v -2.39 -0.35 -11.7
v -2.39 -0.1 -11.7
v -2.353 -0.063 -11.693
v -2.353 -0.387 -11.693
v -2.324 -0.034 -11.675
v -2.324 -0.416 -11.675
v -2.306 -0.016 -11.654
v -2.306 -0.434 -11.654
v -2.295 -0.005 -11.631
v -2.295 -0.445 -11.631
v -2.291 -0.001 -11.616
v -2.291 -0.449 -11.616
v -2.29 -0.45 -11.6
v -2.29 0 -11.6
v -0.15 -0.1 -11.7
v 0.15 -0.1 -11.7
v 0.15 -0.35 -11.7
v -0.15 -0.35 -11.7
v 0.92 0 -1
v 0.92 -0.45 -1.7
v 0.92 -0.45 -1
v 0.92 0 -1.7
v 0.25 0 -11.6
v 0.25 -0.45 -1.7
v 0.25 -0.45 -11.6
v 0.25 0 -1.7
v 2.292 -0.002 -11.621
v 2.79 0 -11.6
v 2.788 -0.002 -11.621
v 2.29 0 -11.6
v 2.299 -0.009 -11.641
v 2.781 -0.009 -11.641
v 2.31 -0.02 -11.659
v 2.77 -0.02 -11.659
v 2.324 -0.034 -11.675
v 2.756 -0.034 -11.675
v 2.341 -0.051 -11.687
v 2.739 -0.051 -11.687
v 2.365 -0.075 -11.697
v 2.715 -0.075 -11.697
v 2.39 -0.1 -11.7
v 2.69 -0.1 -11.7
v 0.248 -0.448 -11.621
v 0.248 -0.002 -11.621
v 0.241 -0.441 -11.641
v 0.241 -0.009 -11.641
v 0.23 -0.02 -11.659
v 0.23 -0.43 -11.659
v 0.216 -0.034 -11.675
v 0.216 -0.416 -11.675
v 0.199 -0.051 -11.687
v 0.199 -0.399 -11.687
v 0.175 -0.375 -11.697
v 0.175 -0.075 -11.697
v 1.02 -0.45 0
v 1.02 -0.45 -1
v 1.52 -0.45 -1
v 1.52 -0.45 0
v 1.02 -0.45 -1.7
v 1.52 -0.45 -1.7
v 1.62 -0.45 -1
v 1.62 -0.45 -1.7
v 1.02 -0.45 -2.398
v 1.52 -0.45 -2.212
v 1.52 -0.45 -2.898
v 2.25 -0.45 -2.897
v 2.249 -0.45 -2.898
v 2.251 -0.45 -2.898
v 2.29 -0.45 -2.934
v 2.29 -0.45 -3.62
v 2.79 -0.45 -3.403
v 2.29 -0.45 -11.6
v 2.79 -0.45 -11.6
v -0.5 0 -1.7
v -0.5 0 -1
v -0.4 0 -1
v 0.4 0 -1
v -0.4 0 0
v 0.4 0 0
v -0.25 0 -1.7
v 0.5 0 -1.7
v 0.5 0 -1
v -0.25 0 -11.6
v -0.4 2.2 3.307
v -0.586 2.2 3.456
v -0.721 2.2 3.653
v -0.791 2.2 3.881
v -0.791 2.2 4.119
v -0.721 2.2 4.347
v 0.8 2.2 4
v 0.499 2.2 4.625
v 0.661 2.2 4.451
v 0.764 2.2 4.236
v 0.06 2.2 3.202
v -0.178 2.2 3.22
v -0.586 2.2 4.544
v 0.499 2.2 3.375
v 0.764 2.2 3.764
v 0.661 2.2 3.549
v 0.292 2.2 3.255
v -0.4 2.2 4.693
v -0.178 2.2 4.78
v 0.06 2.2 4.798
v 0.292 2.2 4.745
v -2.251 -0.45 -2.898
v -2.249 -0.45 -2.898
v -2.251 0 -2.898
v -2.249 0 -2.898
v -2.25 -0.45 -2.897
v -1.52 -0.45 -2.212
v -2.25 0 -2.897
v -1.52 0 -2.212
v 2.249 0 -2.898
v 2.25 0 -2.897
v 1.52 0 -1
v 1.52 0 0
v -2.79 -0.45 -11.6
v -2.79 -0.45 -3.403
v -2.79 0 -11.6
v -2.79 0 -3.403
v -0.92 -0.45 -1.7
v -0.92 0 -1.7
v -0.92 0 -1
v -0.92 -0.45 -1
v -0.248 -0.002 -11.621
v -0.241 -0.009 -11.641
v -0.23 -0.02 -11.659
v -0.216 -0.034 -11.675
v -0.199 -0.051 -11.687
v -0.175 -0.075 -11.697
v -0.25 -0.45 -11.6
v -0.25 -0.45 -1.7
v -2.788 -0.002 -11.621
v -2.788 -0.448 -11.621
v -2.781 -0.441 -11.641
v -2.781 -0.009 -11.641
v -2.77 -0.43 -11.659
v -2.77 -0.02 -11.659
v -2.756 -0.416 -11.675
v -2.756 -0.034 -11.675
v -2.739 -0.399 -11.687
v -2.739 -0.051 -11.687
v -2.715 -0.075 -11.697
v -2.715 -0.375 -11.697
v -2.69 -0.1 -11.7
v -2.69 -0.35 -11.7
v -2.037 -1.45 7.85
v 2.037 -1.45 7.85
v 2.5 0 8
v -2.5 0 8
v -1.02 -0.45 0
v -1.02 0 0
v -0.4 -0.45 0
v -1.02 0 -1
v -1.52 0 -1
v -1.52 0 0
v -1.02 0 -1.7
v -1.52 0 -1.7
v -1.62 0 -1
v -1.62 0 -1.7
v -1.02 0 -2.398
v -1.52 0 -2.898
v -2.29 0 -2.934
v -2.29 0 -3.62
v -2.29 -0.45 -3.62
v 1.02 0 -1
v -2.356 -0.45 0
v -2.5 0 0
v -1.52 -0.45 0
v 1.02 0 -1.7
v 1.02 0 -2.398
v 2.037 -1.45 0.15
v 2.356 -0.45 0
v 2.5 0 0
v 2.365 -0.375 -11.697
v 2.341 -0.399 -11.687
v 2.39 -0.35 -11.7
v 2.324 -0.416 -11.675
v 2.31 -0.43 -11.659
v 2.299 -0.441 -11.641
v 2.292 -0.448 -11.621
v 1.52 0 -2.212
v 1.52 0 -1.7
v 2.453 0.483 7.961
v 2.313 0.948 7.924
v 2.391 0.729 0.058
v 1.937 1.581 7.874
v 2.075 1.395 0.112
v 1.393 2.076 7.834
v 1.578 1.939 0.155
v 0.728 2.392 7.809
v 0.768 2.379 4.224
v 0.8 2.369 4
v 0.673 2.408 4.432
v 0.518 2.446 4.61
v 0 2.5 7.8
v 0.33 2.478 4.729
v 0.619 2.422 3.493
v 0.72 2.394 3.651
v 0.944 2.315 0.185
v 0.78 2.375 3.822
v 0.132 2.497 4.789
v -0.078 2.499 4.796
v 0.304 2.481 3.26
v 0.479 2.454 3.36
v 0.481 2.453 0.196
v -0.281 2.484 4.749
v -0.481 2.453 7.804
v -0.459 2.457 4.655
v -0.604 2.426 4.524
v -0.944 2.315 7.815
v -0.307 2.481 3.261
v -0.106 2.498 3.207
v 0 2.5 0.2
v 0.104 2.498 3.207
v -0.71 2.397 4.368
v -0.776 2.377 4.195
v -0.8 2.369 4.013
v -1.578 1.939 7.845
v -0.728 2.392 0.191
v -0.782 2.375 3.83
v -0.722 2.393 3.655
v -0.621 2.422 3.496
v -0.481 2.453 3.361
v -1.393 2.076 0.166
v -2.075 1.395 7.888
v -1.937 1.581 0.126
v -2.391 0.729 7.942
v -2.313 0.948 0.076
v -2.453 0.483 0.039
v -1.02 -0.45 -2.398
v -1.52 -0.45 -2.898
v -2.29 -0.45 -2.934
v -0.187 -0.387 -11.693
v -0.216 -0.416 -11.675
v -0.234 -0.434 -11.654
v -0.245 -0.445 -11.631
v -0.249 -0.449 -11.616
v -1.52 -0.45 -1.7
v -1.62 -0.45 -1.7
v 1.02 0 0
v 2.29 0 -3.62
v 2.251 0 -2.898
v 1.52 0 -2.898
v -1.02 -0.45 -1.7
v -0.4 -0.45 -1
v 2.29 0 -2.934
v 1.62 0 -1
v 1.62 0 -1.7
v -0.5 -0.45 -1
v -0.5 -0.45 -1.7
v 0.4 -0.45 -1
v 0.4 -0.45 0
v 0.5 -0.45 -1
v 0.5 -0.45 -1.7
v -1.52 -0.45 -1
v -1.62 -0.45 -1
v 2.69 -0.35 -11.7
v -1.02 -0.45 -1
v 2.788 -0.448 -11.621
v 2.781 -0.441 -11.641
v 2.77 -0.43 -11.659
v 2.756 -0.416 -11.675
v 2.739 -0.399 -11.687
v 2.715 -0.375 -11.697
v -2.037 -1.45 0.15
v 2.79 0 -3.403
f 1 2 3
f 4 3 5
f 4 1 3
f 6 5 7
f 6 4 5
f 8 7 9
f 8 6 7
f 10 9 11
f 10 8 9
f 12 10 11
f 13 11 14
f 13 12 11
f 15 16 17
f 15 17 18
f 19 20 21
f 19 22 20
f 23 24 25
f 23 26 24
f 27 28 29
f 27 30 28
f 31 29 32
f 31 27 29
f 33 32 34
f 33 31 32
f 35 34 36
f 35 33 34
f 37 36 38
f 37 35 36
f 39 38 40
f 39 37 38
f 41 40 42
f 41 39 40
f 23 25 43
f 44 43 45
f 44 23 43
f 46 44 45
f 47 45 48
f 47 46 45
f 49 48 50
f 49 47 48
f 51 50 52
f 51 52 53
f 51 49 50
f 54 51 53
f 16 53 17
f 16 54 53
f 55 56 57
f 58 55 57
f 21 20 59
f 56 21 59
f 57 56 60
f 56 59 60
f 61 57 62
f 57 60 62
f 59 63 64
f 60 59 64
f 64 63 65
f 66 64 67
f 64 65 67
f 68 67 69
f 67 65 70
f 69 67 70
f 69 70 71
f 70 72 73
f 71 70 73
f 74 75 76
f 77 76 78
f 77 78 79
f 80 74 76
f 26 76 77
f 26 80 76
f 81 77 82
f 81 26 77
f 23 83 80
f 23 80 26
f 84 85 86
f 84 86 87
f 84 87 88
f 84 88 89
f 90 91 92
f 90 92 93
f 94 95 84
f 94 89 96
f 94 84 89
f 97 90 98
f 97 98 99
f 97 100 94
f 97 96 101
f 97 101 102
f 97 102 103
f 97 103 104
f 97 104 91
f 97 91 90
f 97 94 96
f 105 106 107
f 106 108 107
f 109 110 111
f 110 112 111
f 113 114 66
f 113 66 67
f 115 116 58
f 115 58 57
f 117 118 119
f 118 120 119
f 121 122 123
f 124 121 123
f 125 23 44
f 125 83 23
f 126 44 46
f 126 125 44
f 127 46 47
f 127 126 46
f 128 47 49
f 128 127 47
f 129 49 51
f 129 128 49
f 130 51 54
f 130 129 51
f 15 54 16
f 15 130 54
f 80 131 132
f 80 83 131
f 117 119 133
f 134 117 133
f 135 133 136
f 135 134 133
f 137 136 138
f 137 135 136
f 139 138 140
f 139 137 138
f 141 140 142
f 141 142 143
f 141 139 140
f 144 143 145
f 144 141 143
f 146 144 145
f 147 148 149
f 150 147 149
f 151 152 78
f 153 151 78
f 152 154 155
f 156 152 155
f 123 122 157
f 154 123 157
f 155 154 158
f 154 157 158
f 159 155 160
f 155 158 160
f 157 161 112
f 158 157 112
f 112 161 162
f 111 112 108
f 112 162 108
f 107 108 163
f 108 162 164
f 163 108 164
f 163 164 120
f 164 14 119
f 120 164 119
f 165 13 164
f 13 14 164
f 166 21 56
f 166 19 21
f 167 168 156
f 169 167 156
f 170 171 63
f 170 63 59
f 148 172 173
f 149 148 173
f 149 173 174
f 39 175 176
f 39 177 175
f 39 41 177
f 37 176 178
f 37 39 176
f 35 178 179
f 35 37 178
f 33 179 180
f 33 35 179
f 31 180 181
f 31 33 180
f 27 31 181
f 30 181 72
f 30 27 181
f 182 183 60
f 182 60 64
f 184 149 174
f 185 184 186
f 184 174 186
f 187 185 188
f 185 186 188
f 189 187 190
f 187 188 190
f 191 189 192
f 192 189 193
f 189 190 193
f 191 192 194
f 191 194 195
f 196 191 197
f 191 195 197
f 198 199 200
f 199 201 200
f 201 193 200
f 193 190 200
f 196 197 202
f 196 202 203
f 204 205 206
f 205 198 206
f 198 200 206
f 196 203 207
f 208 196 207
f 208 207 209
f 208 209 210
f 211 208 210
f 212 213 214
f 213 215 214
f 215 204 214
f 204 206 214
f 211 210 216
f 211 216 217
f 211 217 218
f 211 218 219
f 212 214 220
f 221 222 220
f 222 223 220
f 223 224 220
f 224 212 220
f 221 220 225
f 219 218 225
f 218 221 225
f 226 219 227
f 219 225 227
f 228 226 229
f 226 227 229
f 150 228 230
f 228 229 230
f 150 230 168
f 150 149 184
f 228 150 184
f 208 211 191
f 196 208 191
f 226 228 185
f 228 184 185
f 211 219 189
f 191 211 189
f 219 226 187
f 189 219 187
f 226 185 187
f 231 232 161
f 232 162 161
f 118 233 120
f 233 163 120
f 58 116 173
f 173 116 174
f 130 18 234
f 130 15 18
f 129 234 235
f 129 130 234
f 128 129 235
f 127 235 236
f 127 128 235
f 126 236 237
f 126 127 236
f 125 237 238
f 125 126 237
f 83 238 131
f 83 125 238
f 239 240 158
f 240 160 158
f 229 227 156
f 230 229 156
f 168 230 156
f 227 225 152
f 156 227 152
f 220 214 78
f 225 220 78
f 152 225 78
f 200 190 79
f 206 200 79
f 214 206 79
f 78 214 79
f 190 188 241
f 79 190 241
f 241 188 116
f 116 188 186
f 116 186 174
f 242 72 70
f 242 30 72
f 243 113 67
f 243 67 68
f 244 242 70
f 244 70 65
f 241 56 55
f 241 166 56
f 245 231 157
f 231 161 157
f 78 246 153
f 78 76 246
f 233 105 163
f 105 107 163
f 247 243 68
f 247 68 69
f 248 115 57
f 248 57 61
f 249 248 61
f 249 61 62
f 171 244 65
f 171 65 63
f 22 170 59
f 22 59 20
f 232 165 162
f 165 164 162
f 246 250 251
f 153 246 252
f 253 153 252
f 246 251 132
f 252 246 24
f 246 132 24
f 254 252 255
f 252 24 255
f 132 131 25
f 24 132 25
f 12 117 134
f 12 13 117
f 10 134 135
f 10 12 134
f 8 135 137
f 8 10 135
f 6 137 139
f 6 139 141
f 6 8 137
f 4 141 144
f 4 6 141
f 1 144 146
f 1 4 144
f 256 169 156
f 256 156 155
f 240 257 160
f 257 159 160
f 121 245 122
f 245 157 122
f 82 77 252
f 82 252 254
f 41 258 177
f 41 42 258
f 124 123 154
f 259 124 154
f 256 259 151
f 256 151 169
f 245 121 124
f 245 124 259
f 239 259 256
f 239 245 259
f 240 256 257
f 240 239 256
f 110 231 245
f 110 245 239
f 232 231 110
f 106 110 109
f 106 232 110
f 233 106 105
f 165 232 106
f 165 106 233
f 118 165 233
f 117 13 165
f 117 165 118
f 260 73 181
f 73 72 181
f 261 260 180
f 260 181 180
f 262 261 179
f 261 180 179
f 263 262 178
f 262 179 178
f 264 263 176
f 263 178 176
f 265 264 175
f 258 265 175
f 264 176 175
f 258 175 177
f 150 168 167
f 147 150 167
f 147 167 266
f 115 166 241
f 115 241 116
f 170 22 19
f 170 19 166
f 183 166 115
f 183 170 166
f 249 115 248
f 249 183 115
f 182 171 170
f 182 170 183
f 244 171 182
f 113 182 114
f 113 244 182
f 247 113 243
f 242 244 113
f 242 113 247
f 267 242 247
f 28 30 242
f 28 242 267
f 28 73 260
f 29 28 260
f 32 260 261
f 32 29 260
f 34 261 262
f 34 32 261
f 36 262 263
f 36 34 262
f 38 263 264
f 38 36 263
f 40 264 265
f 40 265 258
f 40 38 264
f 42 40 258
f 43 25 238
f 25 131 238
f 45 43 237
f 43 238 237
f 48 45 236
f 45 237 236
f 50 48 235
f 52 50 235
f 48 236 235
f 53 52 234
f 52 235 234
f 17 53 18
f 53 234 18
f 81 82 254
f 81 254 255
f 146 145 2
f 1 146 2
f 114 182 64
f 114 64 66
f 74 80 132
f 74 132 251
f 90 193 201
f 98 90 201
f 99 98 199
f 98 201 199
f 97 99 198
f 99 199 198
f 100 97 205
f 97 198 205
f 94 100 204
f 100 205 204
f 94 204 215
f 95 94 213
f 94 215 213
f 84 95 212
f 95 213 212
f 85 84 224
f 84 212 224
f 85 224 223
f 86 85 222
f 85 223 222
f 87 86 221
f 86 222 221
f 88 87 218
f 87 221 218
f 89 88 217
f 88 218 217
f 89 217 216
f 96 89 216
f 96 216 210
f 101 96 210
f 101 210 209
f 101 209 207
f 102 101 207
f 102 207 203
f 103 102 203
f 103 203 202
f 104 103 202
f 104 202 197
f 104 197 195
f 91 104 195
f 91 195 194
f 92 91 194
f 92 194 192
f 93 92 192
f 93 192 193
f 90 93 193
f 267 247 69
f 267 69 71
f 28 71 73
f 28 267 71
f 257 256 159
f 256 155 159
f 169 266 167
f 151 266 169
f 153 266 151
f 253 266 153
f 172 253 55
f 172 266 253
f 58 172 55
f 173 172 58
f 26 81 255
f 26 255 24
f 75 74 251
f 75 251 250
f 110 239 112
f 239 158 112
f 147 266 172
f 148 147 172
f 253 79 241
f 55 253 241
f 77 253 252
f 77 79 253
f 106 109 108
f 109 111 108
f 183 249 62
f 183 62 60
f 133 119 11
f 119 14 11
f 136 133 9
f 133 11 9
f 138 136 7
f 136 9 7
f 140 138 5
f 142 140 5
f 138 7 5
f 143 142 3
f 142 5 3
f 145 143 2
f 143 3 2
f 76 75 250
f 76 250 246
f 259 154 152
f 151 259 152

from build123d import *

# Parameters (mm, degrees)
BOSS_EXTRUDE2_DEPTH = 8
BOSS_EXTRUDE3_DEPTH = 0.225
BOSS_EXTRUDE4_DEPTH = 0.225
BOSS_EXTRUDE7_DEPTH = 0.225
BOSS_EXTRUDE8_DEPTH = 0.225
CUT_EXTRUDE1_DEPTH  = 5
CUT_EXTRUDE2_DEPTH  = 5
CUT_EXTRUDE3_DEPTH  = 5
CUT_EXTRUDE7_DEPTH  = 5
FILLET2_R           = 0.1
SKETCH13_R          = 0.8
CUT_EXTRUDE8_DEPTH  = 0.3


with BuildPart() as part:
    # Sketch1 → Boss-Extrude2 (new body)
    with BuildSketch(Plane.XY):
        with BuildLine():
            Line((-2.036541185, -1.45), (2.036541185, -1.45))
            Line((2.036541185, -1.45), (2.5, 0))
            ThreePointArc((2.5, 0), (0, 2.5), (-2.5, 0))
            Line((-2.5, 0), (-2.036541185, -1.45))
        make_face()
    extrude(amount=BOSS_EXTRUDE2_DEPTH)

    # Sketch3 → Boss-Extrude3 (add)
    with BuildSketch(Plane(origin=(0, -0.225, 0), x_dir=(1, 0, 0), z_dir=(0, 1, 0))):
        Polygon((-0.4, 0), (0.4, 0), (0.4, 1), (0.5, 1), (0.5, 1.7), (0.25, 1.7), (0.25, 11.7), (-0.25, 11.7), (-0.25, 1.7), (-0.5, 1.7), (-0.5, 1), (-0.4, 1), align=None)
    extrude(amount=BOSS_EXTRUDE3_DEPTH)

    # Sketch3<3> → Boss-Extrude4 (add)
    with BuildSketch(Plane(origin=(0, -0.225, 0), x_dir=(1, 0, 0), z_dir=(0, 1, 0))):
        Polygon((-0.4, 0), (0.4, 0), (0.4, 1), (0.5, 1), (0.5, 1.7), (0.25, 1.7), (0.25, 11.7), (-0.25, 11.7), (-0.25, 1.7), (-0.5, 1.7), (-0.5, 1), (-0.4, 1), align=None)
    extrude(amount=-BOSS_EXTRUDE4_DEPTH)

    # Sketch7 → Boss-Extrude7 (add)
    with BuildSketch(Plane(origin=(0, -0.225, 0), x_dir=(1, 0, 0), z_dir=(0, 1, 0))):
        Polygon((1.02, 1), (1.02, 0), (1.27, 0), (1.52, 0), (1.52, 1), (1.62, 1), (1.62, 1.7), (1.52, 1.7), (1.52, 2.211954512), (2.250085443, 2.896837591), (2.249444332, 2.897521015), (2.250813973, 2.897521015), (2.29, 2.934280887), (2.79, 3.403323987), (2.79, 4.08889049), (2.79, 11.7), (2.29, 11.7), (2.29, 3.61984739), (1.52, 2.897521015), (1.02, 2.397521015), (1.02, 2.211954512), (1.02, 1.7), (0.92, 1.7), (0.92, 1), align=None)
    boss_extrude7 = extrude(amount=BOSS_EXTRUDE7_DEPTH)

    # Sketch7<7> → Boss-Extrude8 (add)
    with BuildSketch(Plane(origin=(0, -0.225, 0), x_dir=(1, 0, 0), z_dir=(0, 1, 0))):
        Polygon((1.02, 1), (1.02, 0), (1.27, 0), (1.52, 0), (1.52, 1), (1.62, 1), (1.62, 1.7), (1.52, 1.7), (1.52, 2.211954512), (2.250085443, 2.896837591), (2.249444332, 2.897521015), (2.250813973, 2.897521015), (2.29, 2.934280887), (2.79, 3.403323987), (2.79, 4.08889049), (2.79, 11.7), (2.29, 11.7), (2.29, 3.61984739), (1.52, 2.897521015), (1.02, 2.397521015), (1.02, 2.211954512), (1.02, 1.7), (0.92, 1.7), (0.92, 1), align=None)
    boss_extrude8 = extrude(amount=-BOSS_EXTRUDE8_DEPTH)

    # Mirror2: Boss-Extrude7, Boss-Extrude8 across plane
    add(boss_extrude7.mirror(Plane(origin=(0, 0, 0), x_dir=(0, 0, 1), z_dir=(1, 0, 0))))
    add(boss_extrude8.mirror(Plane(origin=(0, 0, 0), x_dir=(0, 0, 1), z_dir=(1, 0, 0))))

    # Sketch9 → Cut-Extrude1 (cut)
    with BuildSketch(Plane(origin=(2.5, 0, 0), x_dir=(0, 0, -1), z_dir=(1, 0, 0))):
        Polygon((-8, 0), (-7.8, 2.5), (-8, 2.5), align=None)
    extrude(amount=-CUT_EXTRUDE1_DEPTH, mode=Mode.SUBTRACT)

    # Sketch10 → Cut-Extrude2 (cut)
    with BuildSketch(Plane(origin=(2.5, 0, 0), x_dir=(0, 0, -1), z_dir=(1, 0, 0))):
        Polygon((-8, 0), (-8, -1.45), (-7.85, -1.45), align=None)
    extrude(amount=-CUT_EXTRUDE2_DEPTH, mode=Mode.SUBTRACT)

    # Sketch11 → Cut-Extrude3 (cut)
    with BuildSketch(Plane(origin=(2.5, 0, 0), x_dir=(0, 0, -1), z_dir=(1, 0, 0))):
        Polygon((-0.2, 2.5), (0, 0), (0, 2.5), align=None)
    extrude(amount=-CUT_EXTRUDE3_DEPTH, mode=Mode.SUBTRACT)

    # Sketch12 → Cut-Extrude7 (cut)
    with BuildSketch(Plane(origin=(2.5, 0, 0), x_dir=(0, 0, -1), z_dir=(1, 0, 0))):
        Polygon((0, -0.45), (0, -1.45), (-0.15, -1.45), align=None)
    extrude(amount=-CUT_EXTRUDE7_DEPTH, mode=Mode.SUBTRACT)

    # Fillet2
    fillet2_edges = [part.edges().sort_by_distance(p)[0] for p in [
        (2.54, -0.45, -11.7),
        (0, 0, -11.7),
        (0.25, -0.225, -11.7),
        (-2.29, -0.225, -11.7),
        (-2.79, -0.225, -11.7),
        (-0.25, -0.225, -11.7),
        (-2.54, 0, -11.7),
        (-2.54, -0.45, -11.7),
        (0, -0.45, -11.7),
        (2.54, 0, -11.7),
        (2.79, -0.225, -11.7),
        (2.29, -0.225, -11.7),
    ]]
    fillet(fillet2_edges, radius=FILLET2_R)

    # Sketch13 → Cut-Extrude8 (cut)
    with BuildSketch(Plane(origin=(0, 2.5, 0), x_dir=(1, 0, 0), z_dir=(0, 1, 0))):
        with Locations((0, -4)):
            Circle(SKETCH13_R)
    extrude(amount=-CUT_EXTRUDE8_DEPTH, mode=Mode.SUBTRACT)


solid = part.part
